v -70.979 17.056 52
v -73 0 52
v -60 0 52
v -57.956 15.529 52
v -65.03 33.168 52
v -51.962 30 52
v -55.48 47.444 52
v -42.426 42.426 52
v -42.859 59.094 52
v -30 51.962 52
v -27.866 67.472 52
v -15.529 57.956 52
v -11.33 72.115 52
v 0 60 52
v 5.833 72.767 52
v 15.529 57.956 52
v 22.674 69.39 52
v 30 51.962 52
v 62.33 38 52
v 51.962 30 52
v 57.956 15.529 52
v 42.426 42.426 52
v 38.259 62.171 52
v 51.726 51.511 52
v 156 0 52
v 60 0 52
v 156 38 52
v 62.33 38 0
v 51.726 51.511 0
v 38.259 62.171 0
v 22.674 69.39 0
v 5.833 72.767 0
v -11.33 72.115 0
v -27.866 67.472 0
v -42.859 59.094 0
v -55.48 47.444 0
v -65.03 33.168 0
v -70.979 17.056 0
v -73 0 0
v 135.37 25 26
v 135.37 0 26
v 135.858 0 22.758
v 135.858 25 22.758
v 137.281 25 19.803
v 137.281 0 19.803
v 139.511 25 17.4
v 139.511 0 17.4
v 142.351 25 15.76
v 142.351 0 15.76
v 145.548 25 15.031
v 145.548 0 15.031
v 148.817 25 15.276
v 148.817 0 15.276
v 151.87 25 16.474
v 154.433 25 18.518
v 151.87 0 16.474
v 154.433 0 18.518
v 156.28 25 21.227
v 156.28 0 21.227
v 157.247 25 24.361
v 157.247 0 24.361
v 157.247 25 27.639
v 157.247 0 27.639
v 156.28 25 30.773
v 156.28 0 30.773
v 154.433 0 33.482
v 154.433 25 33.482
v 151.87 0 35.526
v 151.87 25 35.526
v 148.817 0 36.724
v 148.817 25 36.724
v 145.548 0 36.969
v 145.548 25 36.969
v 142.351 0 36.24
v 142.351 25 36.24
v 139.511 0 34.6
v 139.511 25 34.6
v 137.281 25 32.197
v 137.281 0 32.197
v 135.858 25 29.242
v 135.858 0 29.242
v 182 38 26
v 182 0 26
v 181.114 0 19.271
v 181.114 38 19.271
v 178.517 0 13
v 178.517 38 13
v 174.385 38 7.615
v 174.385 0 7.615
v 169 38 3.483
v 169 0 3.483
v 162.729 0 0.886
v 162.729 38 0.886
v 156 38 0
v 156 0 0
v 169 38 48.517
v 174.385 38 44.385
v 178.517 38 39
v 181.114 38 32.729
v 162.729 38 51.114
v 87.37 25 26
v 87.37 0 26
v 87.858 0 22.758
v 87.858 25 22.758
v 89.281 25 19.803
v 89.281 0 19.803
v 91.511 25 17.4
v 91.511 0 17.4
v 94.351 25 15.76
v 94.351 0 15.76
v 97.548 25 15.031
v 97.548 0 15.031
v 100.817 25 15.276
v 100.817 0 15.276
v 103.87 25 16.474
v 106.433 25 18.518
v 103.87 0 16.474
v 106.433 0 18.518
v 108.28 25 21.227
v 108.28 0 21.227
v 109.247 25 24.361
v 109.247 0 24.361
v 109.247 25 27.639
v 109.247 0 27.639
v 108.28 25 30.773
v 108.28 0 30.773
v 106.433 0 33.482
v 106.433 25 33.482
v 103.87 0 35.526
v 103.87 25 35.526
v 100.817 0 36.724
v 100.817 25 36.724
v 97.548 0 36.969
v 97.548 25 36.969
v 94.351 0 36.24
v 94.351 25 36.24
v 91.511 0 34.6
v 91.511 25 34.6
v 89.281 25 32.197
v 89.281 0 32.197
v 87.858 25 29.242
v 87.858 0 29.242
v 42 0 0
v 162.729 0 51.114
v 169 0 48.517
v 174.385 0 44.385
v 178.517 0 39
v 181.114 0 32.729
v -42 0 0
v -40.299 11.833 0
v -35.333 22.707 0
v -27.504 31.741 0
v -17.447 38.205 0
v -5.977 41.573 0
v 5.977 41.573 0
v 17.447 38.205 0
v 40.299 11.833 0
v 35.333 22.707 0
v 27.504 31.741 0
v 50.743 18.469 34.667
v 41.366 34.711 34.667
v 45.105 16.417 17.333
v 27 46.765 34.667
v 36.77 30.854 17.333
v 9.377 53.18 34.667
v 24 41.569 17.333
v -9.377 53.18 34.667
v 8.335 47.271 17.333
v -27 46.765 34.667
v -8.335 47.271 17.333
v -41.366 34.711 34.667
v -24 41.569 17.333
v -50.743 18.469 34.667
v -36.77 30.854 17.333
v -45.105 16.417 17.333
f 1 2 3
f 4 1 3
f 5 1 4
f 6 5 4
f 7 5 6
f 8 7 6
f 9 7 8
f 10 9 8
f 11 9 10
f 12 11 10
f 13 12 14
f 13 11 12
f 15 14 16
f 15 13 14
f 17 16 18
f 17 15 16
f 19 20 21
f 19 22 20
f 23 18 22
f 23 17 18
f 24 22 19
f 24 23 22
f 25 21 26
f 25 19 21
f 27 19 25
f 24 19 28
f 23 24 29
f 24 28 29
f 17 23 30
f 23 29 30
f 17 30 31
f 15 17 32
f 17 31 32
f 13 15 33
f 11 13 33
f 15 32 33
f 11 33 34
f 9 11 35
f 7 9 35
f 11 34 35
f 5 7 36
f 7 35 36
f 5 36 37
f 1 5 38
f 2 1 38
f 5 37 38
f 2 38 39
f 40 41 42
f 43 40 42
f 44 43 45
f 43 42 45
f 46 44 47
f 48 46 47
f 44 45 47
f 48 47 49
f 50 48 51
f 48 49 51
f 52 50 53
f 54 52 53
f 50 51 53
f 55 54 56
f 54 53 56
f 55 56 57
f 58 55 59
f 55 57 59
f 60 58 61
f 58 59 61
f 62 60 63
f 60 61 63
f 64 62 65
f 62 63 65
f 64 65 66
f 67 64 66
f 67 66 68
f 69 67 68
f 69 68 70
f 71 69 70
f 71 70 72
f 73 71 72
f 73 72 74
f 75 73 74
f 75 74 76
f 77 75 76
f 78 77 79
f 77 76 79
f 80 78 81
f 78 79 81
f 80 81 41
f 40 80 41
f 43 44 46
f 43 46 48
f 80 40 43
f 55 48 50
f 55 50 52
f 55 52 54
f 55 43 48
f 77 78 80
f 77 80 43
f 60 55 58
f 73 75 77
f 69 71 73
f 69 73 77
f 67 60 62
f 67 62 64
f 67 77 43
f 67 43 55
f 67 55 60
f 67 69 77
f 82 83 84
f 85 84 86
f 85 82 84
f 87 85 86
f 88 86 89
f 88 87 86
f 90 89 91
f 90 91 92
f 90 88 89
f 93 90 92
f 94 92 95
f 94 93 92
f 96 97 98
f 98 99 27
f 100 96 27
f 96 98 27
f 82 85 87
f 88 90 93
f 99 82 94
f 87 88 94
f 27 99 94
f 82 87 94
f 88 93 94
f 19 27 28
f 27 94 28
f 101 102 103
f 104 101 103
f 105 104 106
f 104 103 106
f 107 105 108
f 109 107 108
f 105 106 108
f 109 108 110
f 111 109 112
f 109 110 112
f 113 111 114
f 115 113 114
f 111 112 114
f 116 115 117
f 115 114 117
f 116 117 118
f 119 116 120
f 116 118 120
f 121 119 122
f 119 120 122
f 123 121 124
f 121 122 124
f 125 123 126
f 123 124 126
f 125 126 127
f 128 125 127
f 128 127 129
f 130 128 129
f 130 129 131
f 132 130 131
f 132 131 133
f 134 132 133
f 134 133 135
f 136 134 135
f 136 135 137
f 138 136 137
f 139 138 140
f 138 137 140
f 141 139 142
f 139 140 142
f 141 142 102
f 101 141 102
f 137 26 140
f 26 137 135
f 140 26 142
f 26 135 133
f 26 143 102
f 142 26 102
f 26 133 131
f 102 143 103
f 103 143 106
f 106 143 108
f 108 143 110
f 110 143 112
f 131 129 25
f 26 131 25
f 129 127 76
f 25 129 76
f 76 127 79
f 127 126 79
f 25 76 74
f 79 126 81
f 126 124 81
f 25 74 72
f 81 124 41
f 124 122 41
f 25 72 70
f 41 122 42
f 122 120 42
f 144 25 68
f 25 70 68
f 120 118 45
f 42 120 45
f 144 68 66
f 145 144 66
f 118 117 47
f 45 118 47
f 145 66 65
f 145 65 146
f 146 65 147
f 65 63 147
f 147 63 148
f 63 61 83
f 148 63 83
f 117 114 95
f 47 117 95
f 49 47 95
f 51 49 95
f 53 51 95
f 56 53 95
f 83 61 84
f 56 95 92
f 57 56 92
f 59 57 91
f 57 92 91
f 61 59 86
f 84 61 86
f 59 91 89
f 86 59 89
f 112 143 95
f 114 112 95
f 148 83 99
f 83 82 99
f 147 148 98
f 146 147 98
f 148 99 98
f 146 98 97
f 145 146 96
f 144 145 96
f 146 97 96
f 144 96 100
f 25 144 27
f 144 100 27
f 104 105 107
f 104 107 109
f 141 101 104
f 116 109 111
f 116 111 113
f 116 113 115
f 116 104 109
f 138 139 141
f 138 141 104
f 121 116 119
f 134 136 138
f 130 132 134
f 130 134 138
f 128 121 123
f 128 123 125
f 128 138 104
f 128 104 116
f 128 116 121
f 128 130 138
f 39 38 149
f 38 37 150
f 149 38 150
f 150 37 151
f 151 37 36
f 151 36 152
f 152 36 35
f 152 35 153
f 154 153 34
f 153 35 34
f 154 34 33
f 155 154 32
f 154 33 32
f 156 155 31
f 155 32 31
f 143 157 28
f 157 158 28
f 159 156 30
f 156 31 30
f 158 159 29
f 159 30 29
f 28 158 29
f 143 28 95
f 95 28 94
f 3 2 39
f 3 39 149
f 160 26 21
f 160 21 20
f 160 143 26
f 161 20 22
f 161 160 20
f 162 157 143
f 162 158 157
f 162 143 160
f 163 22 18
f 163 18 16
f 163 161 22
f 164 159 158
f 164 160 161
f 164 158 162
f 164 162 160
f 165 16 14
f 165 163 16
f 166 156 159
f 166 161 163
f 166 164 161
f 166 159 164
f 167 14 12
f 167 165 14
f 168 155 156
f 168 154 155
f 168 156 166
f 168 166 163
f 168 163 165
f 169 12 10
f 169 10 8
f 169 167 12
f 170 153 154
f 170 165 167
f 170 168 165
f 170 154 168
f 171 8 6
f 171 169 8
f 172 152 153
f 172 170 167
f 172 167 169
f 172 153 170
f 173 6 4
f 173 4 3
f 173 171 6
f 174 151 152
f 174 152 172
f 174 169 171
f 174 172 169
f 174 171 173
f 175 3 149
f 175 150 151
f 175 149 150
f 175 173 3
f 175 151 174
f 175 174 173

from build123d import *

# Parameters (mm, degrees)
F1_DEPTH = 52
F5_DEPTH = 25
F6_R     = 26
F7_R     = 25.99999


# Not quite as in the source:
# - a fillet or chamfer is up to 0.001 mm smaller than in the source, because OpenCascade refuses the exact size


with BuildPart() as f1:
    # F0 (on Top) → F1 (new body)
    with BuildSketch(Plane.XY):
        with BuildLine():
            Line((182, 38), (62.329768169, 38))
            ThreePointArc((62.329768169, 38), (-19.7348286497, 70.2818364741), (-73, 0))
            Line((-73, 0), (0, 0))
            Line((0, 0), (182, 0))
            Line((182, 0), (182, 38))
        make_face()
    extrude(amount=F1_DEPTH)

    # F2 (on face) → F3 (revolve, cut)
    with BuildSketch(Plane.XZ):
        Polygon((0, 52), (-60, 52), (-42, 0), (0, 0), align=None)
    revolve(axis=Axis((0, 0, 26), (0, 0, 1)), mode=Mode.SUBTRACT)

    # F4 (on face) → F5 (cut)
    with BuildSketch(Plane.XZ):
        with BuildLine():
            Line((87.3696654439, 26), (109.3696654439, 26))
            ThreePointArc((109.3696654439, 26), (98.3696654439, 37), (87.3696654439, 26))
        make_face()
        with BuildLine():
            ThreePointArc((157.3696654439, 26), (146.3696654439, 37), (135.3696654439, 26))
            Line((135.3696654439, 26), (157.3696654439, 26))
        make_face()
        with BuildLine():
            Line((157.3696654439, 26), (135.3696654439, 26))
            ThreePointArc((135.3696654439, 26), (146.3696654439, 15), (157.3696654439, 26))
        make_face()
        with BuildLine():
            ThreePointArc((87.3696654439, 26), (98.3696654439, 15), (109.3696654439, 26))
            Line((109.3696654439, 26), (87.3696654439, 26))
        make_face()
    extrude(amount=-F5_DEPTH, mode=Mode.SUBTRACT)

    # F6
    f6_edges = [f1.edges().sort_by_distance(p)[0] for p in [
        (182, 19, 52),
    ]]
    fillet(f6_edges, radius=F6_R)

    # F7 (radius 26 in the source; OpenCascade refuses exactly that, so slightly less here)
    f7_edges = [f1.edges().sort_by_distance(p)[0] for p in [
        (182, 19, 0),
    ]]
    fillet(f7_edges, radius=F7_R)


solid = f1.part
